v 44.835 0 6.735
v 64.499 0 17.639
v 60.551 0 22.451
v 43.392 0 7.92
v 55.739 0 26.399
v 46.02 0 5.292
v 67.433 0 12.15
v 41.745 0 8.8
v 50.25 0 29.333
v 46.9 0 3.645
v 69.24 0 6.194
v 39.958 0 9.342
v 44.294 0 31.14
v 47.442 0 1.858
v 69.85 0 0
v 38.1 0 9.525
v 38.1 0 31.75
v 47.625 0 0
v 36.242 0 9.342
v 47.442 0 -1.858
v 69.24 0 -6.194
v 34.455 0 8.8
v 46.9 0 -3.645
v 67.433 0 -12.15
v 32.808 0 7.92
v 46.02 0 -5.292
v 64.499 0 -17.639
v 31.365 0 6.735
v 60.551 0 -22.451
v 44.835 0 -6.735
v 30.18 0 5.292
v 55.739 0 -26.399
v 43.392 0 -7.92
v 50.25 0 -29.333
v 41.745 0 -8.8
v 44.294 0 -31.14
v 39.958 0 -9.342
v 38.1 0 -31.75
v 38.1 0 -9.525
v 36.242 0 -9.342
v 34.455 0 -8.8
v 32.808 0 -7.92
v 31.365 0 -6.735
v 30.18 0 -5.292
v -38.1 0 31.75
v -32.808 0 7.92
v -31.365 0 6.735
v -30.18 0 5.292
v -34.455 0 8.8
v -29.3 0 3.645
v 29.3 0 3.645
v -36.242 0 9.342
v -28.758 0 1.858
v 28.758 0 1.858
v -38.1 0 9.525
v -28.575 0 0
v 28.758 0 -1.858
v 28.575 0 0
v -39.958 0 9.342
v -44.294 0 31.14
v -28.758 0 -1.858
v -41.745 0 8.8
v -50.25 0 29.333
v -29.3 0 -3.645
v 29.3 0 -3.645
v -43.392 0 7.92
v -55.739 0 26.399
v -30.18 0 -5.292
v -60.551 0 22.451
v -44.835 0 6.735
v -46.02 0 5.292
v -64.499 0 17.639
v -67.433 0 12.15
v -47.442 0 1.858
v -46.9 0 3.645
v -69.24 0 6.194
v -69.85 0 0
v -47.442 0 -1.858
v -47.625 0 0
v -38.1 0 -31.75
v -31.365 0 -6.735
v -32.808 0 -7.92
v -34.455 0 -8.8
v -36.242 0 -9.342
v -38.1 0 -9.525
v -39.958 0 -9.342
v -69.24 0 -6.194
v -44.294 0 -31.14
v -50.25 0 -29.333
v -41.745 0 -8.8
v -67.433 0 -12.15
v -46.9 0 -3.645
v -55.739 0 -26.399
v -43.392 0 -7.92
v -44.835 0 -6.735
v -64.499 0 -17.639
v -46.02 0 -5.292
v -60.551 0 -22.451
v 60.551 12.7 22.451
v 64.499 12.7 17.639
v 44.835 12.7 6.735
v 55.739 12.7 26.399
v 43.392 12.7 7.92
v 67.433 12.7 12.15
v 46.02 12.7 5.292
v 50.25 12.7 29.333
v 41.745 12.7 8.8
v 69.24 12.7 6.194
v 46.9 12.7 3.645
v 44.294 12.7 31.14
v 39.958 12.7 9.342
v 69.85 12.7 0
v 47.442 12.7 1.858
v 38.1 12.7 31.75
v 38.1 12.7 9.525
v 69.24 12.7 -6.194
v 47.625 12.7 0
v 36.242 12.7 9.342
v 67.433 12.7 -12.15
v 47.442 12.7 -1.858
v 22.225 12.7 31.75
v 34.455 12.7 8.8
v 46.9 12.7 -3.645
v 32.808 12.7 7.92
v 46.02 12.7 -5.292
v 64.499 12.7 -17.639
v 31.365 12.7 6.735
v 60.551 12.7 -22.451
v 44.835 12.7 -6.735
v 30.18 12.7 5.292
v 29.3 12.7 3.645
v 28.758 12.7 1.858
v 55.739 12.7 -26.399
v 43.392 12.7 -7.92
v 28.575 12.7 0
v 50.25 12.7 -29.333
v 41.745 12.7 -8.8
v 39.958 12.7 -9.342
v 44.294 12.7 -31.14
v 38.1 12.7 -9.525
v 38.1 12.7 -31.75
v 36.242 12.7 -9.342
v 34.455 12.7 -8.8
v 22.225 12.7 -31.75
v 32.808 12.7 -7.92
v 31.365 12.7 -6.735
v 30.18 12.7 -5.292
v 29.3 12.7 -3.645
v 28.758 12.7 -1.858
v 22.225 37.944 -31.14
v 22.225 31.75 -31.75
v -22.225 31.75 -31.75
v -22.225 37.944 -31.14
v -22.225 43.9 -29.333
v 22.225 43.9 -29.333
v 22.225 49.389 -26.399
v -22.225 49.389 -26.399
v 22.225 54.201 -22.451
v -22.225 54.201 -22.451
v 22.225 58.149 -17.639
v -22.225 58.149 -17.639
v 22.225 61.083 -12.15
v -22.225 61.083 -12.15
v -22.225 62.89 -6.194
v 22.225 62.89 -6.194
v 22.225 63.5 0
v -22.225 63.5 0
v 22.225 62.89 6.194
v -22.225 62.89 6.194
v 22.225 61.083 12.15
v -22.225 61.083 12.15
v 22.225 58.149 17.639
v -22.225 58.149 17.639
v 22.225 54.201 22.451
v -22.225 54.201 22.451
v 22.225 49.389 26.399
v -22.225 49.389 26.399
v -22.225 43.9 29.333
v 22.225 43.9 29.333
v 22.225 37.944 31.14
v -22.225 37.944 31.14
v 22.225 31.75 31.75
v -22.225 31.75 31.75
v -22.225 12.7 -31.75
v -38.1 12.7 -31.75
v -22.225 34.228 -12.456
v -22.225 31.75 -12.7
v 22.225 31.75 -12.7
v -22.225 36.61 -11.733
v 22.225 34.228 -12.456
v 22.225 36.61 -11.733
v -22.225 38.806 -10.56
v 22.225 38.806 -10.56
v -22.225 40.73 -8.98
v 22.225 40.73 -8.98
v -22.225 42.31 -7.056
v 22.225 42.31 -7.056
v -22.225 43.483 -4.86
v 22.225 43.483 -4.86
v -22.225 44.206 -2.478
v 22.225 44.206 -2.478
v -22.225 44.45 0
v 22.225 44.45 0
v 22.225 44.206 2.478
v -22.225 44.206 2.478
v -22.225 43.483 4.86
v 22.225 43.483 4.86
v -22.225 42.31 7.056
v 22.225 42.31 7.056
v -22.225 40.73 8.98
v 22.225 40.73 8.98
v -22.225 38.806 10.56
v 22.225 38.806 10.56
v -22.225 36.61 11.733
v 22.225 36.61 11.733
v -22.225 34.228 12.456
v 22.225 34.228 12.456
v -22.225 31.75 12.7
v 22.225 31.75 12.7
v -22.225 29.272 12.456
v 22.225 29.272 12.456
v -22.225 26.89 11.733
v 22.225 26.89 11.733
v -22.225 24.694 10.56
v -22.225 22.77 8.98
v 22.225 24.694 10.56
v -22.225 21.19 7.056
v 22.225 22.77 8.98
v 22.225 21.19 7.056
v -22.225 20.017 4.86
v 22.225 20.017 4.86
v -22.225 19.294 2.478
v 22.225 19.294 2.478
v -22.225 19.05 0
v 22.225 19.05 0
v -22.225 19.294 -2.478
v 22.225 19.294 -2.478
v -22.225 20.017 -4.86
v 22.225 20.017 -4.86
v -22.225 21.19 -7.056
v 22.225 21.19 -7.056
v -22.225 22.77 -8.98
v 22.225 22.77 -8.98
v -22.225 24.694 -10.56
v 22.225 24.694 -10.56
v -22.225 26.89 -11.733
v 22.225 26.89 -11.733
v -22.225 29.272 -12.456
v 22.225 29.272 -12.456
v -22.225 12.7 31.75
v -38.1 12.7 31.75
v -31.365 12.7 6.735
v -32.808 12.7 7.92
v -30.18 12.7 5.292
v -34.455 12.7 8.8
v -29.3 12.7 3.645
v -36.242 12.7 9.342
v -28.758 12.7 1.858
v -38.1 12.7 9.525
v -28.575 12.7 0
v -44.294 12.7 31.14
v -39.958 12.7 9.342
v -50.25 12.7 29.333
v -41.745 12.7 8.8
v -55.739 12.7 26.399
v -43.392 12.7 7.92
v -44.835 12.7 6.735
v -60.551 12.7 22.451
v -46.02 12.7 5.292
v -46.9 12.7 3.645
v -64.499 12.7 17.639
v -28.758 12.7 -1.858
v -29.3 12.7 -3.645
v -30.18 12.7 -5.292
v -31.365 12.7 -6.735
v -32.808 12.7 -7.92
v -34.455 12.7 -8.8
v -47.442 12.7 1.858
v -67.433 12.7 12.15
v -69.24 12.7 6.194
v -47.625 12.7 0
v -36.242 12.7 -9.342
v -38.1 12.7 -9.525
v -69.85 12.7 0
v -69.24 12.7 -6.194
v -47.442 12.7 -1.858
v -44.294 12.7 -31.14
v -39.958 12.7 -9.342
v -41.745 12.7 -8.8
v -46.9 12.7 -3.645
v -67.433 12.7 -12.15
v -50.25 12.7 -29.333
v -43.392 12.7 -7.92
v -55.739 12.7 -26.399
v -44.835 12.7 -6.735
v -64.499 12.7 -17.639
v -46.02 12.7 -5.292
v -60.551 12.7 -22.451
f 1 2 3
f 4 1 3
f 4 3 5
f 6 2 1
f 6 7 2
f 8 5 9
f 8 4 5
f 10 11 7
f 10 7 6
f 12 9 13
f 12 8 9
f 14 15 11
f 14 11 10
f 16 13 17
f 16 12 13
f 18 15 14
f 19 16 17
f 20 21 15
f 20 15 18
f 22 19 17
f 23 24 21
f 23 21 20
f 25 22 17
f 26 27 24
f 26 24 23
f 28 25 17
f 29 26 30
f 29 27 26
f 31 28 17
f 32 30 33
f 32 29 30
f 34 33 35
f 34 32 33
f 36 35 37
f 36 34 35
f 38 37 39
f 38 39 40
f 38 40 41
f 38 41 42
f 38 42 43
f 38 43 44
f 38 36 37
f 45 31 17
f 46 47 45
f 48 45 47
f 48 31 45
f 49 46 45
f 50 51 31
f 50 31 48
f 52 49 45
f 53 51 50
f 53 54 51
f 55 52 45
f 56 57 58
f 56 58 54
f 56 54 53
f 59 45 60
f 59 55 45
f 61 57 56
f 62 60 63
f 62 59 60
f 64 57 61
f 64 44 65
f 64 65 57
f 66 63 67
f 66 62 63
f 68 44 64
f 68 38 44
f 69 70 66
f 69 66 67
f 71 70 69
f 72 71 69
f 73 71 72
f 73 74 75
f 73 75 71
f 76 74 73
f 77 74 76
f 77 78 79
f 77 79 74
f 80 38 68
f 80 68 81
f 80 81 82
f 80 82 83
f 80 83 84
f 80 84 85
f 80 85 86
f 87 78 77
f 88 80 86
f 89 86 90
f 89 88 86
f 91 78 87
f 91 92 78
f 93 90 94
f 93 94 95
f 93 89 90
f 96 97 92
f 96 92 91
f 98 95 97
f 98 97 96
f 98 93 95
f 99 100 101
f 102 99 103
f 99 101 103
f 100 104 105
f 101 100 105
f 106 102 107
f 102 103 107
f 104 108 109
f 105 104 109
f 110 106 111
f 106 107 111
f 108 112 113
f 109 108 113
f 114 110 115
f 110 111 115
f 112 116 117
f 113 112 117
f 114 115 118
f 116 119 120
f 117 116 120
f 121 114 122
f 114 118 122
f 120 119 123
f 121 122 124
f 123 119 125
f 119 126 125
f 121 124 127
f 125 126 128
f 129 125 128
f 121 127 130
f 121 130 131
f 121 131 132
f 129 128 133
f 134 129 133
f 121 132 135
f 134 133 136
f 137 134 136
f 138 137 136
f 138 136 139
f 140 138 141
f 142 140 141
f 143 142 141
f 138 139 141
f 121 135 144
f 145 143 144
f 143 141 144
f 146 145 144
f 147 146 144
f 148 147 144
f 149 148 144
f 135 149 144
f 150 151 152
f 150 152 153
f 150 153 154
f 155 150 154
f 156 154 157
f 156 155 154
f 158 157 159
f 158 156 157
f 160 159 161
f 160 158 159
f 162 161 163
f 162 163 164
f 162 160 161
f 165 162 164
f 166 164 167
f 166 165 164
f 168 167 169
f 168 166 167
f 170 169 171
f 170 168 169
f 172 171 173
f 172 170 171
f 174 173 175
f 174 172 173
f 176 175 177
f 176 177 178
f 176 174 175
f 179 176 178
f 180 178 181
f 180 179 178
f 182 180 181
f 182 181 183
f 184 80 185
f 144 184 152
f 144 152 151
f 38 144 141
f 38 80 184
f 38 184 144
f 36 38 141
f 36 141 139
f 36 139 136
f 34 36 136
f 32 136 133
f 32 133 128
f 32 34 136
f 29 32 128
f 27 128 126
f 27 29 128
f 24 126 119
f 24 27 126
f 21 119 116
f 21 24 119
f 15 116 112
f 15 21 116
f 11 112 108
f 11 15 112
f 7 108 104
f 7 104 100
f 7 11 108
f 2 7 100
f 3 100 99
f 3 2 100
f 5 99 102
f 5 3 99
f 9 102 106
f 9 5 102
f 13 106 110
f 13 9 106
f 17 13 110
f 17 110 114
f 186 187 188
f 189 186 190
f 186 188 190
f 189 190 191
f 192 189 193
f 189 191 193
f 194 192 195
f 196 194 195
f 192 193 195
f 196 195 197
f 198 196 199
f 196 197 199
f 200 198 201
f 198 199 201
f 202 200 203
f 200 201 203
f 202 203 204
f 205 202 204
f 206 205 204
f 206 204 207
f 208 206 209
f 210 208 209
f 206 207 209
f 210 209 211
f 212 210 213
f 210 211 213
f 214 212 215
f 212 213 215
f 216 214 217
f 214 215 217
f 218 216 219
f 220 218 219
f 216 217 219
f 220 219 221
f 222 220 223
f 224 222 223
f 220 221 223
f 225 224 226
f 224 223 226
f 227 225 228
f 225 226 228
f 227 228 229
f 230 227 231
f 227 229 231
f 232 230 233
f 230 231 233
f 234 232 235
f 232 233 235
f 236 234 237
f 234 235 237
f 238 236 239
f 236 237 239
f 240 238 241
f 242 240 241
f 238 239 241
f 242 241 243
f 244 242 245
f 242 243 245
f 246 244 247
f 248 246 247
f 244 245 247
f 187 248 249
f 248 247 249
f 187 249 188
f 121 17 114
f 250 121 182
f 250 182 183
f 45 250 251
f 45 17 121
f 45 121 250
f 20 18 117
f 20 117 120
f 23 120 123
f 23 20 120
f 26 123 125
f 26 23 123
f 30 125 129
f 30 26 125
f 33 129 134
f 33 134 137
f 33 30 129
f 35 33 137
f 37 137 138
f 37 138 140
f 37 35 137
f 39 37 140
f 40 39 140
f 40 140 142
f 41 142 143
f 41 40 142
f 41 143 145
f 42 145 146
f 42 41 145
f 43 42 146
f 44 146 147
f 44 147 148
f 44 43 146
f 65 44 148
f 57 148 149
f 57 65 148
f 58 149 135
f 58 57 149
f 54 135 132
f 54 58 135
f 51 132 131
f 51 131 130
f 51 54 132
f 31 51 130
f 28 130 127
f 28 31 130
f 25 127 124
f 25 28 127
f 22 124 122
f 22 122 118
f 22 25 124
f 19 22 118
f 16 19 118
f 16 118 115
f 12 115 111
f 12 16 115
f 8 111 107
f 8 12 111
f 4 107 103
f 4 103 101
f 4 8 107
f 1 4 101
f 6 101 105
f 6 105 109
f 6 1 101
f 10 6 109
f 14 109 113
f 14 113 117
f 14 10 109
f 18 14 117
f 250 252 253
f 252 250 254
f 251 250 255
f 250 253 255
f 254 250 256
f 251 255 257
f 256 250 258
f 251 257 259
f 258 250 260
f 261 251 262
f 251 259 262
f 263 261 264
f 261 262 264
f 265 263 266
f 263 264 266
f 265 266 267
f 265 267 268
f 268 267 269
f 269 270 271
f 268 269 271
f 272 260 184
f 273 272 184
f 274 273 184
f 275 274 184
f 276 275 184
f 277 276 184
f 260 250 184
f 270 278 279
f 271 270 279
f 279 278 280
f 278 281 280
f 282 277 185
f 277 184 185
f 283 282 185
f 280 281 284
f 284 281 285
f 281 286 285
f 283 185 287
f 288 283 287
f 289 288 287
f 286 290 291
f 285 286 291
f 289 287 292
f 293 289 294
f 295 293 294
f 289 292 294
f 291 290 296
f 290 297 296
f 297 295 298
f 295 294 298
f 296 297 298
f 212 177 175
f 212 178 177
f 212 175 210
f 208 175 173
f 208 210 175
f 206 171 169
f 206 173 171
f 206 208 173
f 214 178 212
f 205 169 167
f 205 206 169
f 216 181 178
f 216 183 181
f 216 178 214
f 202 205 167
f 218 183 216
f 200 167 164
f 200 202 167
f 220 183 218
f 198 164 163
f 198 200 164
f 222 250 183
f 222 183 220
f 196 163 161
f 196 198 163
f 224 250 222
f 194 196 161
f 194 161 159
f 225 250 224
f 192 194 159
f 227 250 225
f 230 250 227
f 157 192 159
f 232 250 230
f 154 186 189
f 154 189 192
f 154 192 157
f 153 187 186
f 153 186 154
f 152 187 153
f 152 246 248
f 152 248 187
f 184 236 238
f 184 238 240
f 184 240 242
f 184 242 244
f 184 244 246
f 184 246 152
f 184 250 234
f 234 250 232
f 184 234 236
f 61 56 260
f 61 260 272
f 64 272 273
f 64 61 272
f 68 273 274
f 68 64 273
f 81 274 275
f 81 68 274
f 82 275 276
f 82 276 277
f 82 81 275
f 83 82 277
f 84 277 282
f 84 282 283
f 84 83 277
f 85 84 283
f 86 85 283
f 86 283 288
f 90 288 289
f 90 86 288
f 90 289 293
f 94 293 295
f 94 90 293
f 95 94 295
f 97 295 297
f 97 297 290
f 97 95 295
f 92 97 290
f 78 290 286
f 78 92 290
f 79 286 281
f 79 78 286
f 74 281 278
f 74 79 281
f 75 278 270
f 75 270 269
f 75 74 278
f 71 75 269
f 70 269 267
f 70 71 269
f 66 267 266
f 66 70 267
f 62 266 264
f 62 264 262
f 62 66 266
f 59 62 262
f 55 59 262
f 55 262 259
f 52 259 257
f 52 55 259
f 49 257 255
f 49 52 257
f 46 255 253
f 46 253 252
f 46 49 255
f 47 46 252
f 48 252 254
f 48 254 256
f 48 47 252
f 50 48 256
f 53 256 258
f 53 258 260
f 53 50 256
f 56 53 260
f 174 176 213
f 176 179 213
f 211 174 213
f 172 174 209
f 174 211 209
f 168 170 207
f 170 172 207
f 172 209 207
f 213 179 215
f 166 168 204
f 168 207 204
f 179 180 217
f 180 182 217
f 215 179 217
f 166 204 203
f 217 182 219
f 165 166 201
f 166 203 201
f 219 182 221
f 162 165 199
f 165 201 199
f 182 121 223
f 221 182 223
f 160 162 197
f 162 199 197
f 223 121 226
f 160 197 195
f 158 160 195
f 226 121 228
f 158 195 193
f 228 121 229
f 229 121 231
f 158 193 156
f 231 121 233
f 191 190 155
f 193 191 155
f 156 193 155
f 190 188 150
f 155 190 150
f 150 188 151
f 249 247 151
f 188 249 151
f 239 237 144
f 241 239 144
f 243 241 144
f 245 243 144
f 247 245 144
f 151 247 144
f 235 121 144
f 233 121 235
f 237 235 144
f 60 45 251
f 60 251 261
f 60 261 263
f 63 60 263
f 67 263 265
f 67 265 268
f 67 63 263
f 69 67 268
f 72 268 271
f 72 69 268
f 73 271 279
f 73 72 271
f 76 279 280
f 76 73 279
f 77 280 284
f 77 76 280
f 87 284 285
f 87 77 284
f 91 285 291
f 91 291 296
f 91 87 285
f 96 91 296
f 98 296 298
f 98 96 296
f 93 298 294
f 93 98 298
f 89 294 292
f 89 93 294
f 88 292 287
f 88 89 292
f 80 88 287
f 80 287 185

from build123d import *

# Parameters (mm, degrees)
SKETCH1_R           = 9.525
BOSS_EXTRUDE2_DEPTH = 12.7
SKETCH2_W           = 44.45
SKETCH2_H           = 63.5
BOSS_EXTRUDE3_DEPTH = 19.05
BOSS_EXTRUDE4_DEPTH = 44.45
SKETCH4_R           = 12.7
CUT_EXTRUDE1_DEPTH  = 44.45


with BuildPart() as part:
    # Sketch1 → Boss-Extrude2 (new body)
    with BuildSketch(Plane(origin=(0, 0, 0), x_dir=(1, 0, 0), z_dir=(0, 1, 0))):
        with BuildLine():
            Line((-38.1, 31.75), (38.1, 31.75))
            ThreePointArc((38.1, 31.75), (69.85, 0), (38.1, -31.75))
            Line((38.1, -31.75), (-38.1, -31.75))
            ThreePointArc((-38.1, -31.75), (-69.85, 0), (-38.1, 31.75))
        make_face()
        with Locations((-38.1, 0)):
            Circle(SKETCH1_R, mode=Mode.SUBTRACT)
        with Locations((38.1, 0)):
            Circle(SKETCH1_R, mode=Mode.SUBTRACT)
    extrude(amount=BOSS_EXTRUDE2_DEPTH)

    # Sketch2 → Boss-Extrude3 (add)
    with BuildSketch(Plane(origin=(0, 12.7, 0), x_dir=(1, 0, 0), z_dir=(0, 1, 0))):
        Rectangle(SKETCH2_W, SKETCH2_H)
    extrude(amount=BOSS_EXTRUDE3_DEPTH)

    # Sketch3 → Boss-Extrude4 (add)
    with BuildSketch(Plane(origin=(22.225, 0, 0), x_dir=(0, 0, -1), z_dir=(1, 0, 0))):
        with BuildLine():
            Line((-31.75, 12.7), (31.75, 12.7))
            Line((31.75, 12.7), (31.75, 31.75))
            ThreePointArc((31.75, 31.75), (0, 63.5), (-31.75, 31.75))
            Line((-31.75, 31.75), (-31.75, 12.7))
        make_face()
    extrude(amount=-BOSS_EXTRUDE4_DEPTH)

    # Sketch4 → Cut-Extrude1 (cut)
    with BuildSketch(Plane(origin=(22.225, 0, 0), x_dir=(0, 0, -1), z_dir=(1, 0, 0))):
        with Locations((0, 31.75)):
            Circle(SKETCH4_R)
    extrude(amount=-CUT_EXTRUDE1_DEPTH, mode=Mode.SUBTRACT)


solid = part.part
